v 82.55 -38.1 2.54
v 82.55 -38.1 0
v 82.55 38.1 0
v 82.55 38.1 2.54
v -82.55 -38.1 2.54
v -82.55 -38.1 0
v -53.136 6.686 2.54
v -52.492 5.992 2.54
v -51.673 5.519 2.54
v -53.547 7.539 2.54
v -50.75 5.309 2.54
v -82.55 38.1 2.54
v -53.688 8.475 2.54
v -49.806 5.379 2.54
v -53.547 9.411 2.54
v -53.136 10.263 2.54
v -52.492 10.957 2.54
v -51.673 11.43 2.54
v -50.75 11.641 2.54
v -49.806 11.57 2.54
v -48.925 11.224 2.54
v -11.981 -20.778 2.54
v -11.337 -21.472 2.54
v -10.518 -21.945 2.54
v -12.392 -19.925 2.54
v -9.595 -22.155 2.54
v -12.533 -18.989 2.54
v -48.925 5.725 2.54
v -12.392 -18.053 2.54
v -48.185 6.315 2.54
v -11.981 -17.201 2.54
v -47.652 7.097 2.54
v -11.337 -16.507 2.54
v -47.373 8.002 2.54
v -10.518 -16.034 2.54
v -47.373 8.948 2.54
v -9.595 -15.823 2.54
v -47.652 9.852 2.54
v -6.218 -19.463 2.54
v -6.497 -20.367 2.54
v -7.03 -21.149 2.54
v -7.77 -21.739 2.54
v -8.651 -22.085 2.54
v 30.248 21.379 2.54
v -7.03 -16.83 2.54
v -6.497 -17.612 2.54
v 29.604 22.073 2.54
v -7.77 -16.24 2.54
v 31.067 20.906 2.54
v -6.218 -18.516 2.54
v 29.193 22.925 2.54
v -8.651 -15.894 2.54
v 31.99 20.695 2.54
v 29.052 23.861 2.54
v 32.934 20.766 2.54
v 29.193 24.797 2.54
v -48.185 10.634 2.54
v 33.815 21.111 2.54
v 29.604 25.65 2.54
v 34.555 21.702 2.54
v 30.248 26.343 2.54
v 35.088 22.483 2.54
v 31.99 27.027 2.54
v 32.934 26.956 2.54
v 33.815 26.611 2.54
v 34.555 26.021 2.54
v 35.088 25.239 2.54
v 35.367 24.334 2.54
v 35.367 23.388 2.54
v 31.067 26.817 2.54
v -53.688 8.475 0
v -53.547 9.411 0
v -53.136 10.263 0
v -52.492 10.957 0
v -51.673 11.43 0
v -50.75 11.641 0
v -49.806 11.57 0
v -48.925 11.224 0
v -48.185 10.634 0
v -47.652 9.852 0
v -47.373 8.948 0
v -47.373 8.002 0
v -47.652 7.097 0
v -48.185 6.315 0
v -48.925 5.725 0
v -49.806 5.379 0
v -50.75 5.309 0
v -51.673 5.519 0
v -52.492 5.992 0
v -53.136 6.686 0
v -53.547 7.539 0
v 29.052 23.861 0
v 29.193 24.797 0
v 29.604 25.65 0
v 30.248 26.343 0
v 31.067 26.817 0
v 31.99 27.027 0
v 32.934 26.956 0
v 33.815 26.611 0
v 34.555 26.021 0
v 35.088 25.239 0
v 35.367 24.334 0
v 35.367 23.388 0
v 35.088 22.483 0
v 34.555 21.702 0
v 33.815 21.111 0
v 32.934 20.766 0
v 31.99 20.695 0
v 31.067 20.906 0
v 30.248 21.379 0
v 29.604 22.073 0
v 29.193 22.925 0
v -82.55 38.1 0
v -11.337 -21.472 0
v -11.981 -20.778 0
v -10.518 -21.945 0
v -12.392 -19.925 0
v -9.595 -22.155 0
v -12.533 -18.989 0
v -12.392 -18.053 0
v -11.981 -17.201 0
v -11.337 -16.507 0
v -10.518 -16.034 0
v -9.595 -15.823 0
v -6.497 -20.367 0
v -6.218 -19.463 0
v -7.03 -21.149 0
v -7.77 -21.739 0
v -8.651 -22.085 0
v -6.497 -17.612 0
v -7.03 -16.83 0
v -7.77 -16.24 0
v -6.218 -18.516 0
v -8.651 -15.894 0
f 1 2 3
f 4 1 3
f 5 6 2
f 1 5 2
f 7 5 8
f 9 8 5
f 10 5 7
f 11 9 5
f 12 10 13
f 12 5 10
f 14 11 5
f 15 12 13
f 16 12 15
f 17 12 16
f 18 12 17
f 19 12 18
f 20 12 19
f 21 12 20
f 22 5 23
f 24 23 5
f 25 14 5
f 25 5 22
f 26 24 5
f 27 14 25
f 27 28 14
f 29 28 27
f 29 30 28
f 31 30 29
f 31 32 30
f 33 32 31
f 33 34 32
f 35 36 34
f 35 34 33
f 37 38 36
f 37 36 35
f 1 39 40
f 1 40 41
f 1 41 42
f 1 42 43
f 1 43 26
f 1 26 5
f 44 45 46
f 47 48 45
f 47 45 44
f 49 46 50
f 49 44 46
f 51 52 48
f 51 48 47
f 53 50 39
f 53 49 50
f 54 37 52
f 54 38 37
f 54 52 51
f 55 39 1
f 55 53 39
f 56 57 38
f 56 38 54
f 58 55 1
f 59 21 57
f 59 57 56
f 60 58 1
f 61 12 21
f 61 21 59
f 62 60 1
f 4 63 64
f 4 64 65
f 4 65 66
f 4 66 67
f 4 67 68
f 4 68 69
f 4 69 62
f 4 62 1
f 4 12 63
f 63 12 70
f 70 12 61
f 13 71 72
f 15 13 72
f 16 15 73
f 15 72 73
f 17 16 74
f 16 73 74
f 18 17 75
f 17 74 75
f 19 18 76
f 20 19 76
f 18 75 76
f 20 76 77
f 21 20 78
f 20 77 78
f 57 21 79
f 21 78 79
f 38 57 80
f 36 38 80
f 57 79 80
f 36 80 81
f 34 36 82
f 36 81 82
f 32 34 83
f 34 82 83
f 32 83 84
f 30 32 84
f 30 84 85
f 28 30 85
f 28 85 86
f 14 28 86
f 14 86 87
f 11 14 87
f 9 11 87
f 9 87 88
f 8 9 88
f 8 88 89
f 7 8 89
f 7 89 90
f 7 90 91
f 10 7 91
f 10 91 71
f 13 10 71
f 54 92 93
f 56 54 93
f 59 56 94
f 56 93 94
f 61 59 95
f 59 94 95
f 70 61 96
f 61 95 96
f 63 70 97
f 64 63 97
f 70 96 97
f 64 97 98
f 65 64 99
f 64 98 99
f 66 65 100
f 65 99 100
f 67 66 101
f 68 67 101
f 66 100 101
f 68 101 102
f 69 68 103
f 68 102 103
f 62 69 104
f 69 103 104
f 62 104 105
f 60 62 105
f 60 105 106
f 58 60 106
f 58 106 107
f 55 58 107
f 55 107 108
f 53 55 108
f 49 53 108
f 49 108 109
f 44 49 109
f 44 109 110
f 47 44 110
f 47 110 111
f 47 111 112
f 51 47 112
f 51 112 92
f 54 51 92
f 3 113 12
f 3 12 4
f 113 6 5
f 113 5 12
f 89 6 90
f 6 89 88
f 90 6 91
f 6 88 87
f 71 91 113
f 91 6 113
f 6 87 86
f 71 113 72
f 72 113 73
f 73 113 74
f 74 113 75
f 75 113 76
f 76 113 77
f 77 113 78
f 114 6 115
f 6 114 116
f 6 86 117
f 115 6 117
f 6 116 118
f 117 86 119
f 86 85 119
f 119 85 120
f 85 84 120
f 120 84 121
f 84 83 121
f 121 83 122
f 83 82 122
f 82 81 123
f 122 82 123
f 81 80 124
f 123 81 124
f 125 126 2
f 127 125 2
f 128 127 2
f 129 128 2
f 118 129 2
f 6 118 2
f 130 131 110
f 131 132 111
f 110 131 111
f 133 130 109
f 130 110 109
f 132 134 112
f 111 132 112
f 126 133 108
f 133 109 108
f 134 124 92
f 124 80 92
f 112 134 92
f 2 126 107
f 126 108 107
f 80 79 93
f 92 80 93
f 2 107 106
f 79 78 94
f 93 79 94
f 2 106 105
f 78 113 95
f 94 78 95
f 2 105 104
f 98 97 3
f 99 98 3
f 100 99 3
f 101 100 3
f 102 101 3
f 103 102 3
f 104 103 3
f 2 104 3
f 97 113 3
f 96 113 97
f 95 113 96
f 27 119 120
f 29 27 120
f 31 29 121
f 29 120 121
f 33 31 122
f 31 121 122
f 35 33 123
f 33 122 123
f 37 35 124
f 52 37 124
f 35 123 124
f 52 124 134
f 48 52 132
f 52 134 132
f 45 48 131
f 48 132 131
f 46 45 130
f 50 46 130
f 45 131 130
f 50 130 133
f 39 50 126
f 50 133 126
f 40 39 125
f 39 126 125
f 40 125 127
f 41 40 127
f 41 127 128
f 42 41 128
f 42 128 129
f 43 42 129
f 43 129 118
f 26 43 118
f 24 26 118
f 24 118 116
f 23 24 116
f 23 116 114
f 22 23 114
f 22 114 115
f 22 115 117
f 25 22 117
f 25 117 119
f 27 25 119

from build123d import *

# Parameters (mm, degrees)
SKETCH1_W                  = 165.1
SKETCH1_H                  = 76.2
BOSS_EXTRUDE1_DEPTH        = 2.54
F_1_4_0_2500_DOWEL_HOLE1_D = 6.35


with BuildPart() as part:
    # Sketch1 → Boss-Extrude1 (new body)
    with BuildSketch(Plane.XY):
        Rectangle(SKETCH1_W, SKETCH1_H)
    extrude(amount=BOSS_EXTRUDE1_DEPTH)

    # 1/4 (0.2500) Dowel Hole1 (through all)
    with Locations(Plane(origin=(-50.512645238, 8.474787733, 2.54), x_dir=(1, 0, 0), z_dir=(0, 0, 1))):
        with Locations((0, 0), (41.154917852, -27.464087264), (82.739905764, 15.386269222)):
            Hole(F_1_4_0_2500_DOWEL_HOLE1_D / 2)


solid = part.part
